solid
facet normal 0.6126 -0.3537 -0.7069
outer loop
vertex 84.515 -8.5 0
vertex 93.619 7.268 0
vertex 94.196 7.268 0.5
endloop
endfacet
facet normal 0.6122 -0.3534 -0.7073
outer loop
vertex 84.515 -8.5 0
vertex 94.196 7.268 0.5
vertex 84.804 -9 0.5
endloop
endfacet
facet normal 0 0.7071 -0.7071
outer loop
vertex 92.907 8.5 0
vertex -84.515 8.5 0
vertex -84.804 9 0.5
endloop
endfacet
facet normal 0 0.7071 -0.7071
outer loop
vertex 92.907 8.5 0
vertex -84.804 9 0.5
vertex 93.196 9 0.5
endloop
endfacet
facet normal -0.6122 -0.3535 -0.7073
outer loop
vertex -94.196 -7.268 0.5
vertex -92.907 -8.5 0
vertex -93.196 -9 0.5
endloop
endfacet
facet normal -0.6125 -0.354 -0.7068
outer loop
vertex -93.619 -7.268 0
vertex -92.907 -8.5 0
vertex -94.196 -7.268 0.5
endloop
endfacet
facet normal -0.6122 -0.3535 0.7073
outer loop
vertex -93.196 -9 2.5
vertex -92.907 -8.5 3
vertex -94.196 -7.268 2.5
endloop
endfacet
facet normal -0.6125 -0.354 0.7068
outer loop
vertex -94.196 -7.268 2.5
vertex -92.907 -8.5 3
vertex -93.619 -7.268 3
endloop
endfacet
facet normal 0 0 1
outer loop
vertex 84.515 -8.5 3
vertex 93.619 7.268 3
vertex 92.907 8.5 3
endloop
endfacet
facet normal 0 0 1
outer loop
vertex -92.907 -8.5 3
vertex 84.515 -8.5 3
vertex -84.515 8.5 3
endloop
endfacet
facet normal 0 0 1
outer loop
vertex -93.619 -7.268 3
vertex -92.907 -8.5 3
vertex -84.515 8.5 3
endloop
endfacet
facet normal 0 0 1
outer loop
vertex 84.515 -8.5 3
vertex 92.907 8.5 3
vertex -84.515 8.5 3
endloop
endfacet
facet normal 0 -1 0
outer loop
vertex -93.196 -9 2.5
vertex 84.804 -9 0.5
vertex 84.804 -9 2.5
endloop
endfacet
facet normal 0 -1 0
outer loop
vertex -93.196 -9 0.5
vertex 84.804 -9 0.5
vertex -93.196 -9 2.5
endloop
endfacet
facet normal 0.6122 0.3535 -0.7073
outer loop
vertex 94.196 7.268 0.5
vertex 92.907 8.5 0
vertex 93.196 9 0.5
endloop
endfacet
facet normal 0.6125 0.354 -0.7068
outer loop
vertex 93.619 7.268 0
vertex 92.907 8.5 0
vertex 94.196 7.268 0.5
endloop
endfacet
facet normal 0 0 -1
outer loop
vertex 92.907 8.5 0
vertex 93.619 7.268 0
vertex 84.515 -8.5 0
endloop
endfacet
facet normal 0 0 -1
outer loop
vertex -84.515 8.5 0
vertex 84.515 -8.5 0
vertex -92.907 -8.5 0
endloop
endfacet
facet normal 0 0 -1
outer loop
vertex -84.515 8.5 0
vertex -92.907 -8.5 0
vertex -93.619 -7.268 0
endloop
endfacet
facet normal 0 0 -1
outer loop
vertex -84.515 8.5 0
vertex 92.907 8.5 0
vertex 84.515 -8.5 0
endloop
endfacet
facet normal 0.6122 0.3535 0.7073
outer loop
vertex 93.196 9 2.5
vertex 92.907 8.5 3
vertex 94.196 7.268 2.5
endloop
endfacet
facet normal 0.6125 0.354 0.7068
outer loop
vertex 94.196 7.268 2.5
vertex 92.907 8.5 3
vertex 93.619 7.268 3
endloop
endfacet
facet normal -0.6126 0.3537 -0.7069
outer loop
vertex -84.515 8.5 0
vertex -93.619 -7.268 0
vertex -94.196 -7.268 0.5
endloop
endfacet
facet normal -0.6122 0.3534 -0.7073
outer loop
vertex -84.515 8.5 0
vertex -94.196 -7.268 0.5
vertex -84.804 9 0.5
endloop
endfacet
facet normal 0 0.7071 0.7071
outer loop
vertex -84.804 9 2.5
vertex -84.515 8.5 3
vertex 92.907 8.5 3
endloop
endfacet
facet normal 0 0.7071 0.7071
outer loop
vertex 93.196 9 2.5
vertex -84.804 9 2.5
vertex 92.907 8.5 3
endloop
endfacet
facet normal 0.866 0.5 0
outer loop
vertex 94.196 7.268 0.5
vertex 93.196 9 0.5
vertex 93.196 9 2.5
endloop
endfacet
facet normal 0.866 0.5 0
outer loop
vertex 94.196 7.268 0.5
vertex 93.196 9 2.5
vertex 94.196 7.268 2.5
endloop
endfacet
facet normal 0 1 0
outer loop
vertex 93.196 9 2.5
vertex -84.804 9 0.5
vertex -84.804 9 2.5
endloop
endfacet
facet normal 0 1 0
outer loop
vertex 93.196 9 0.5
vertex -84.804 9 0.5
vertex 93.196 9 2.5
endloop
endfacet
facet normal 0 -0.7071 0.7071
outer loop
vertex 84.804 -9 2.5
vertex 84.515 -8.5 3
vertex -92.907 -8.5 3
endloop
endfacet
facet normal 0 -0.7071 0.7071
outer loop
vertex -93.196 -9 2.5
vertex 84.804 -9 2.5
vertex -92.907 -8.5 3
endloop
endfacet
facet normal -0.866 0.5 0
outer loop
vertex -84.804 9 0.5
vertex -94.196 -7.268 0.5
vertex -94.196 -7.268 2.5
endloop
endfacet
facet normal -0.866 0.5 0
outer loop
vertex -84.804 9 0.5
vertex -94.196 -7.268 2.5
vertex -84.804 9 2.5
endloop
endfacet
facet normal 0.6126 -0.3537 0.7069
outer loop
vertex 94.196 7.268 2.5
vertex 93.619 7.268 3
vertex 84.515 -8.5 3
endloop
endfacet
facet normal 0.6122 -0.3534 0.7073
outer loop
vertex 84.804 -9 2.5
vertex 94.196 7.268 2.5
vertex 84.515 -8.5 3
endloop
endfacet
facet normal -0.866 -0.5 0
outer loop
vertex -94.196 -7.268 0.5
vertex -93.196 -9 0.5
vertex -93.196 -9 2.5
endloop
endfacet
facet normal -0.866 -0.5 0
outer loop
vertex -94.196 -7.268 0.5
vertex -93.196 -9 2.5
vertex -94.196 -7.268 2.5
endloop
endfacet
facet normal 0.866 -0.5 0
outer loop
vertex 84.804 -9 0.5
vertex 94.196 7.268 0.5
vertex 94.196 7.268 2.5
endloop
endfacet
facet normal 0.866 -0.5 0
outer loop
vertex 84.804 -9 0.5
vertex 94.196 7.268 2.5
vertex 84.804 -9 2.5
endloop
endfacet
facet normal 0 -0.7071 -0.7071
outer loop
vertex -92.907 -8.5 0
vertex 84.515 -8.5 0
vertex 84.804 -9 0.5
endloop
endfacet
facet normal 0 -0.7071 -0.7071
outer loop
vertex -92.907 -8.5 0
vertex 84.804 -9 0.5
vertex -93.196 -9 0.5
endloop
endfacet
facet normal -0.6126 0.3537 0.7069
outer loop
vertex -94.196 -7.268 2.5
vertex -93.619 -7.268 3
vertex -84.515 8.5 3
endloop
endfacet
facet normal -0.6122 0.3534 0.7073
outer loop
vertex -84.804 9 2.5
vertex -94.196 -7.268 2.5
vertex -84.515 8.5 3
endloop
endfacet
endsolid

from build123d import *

# Parameters (mm, degrees)
EXTRUDE_1_DEPTH = 3
CHAMFER_1_SIZE  = 0.5


with BuildPart() as part:
    # 草图1 → 凸台-拉伸1 (new body)
    with BuildSketch(Plane.XY):
        Polygon((84.803847577, -9), (-93.196152423, -9), (-94.196152423, -7.267949192), (-84.803847577, 9), (93.196152423, 9), (94.196152423, 7.267949192), align=None)
    extrude(amount=EXTRUDE_1_DEPTH)

    # 倒角1
    chamfer_1_edges = [part.edges().sort_by_distance(p)[0] for p in [
        (4.196152423, 9, 3),
        (-89.5, 0.866025404, 3),
        (-93.696152423, -8.133974596, 3),
        (-4.196152423, -9, 3),
        (89.5, -0.866025404, 3),
        (-4.196152423, -9, 0),
        (-93.696152423, -8.133974596, 0),
        (-89.5, 0.866025404, 0),
        (4.196152423, 9, 0),
        (93.696152423, 8.133974596, 0),
        (89.5, -0.866025404, 0),
        (93.696152423, 8.133974596, 3),
    ]]
    chamfer(chamfer_1_edges, length=CHAMFER_1_SIZE)


solid = part.part
